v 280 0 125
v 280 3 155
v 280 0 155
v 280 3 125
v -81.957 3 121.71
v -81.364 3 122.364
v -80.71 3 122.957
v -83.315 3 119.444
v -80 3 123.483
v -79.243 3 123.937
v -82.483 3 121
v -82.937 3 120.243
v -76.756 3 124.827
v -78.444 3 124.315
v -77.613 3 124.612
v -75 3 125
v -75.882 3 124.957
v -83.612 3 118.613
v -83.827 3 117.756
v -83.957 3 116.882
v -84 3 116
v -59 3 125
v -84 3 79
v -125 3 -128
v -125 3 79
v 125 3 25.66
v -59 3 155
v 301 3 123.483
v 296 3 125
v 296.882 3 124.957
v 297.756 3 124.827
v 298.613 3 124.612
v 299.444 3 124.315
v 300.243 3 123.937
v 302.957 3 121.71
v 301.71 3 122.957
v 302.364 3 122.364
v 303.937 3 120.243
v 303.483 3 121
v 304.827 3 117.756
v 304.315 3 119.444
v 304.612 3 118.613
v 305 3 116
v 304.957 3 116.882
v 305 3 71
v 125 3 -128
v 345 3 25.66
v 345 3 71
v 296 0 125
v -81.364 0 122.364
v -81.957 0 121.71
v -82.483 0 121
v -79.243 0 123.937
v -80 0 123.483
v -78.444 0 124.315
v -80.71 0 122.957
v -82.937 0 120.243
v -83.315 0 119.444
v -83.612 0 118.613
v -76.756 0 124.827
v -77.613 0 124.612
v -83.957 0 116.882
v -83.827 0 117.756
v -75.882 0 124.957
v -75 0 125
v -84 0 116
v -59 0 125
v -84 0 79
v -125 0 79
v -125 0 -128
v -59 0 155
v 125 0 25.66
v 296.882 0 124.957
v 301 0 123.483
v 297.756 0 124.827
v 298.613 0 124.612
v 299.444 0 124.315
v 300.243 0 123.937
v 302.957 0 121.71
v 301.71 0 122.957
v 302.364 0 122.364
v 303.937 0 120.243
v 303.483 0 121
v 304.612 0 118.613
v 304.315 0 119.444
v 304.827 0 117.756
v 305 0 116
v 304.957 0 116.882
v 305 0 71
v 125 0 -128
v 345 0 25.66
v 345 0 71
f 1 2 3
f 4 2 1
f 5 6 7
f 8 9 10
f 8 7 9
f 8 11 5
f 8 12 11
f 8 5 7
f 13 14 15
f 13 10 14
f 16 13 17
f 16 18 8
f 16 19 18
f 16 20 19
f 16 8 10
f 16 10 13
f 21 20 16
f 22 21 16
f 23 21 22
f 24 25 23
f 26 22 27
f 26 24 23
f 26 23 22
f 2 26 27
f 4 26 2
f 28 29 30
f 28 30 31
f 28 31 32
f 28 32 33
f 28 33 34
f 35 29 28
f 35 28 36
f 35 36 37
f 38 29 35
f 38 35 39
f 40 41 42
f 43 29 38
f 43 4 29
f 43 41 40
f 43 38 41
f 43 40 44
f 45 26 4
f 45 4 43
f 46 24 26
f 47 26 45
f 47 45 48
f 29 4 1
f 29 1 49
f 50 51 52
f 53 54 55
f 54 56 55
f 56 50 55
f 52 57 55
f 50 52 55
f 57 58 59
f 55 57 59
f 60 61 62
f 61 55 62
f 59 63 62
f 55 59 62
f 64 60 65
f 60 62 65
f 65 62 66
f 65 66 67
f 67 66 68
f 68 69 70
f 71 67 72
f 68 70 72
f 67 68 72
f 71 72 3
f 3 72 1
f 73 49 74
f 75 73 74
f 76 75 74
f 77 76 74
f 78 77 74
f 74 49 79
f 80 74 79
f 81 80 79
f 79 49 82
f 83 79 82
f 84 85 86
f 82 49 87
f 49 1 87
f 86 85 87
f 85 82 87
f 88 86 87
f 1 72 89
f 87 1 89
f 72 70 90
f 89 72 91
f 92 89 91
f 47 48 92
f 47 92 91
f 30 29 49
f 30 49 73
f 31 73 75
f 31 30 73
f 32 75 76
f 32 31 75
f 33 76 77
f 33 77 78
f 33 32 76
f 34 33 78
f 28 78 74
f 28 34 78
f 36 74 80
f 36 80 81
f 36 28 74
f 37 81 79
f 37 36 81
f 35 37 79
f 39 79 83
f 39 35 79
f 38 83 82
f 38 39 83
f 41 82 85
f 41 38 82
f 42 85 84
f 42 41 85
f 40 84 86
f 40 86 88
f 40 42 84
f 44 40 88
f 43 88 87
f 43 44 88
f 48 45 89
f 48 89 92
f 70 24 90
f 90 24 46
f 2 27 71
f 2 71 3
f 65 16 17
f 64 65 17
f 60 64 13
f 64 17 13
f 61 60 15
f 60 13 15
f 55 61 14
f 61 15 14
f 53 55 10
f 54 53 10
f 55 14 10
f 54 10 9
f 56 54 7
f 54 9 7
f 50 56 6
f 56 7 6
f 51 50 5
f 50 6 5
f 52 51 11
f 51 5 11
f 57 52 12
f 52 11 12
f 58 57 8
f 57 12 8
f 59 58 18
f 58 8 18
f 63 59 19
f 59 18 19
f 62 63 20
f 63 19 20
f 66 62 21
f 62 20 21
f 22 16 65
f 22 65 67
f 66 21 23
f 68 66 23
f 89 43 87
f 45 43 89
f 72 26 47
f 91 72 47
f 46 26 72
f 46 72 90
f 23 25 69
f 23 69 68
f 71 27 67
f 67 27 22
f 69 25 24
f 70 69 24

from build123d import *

# Parameters (mm, degrees)
CROQUIS1_W              = 250
CROQUIS1_H              = 250
SALIENTE_EXTRUIR1_DEPTH = 3
CROQUIS2_W              = 250
CROQUIS2_H              = 3
SALIENTE_EXTRUIR2_DEPTH = 3
CROQUIS3_W              = 220
CROQUIS3_H              = 99.34
SALIENTE_EXTRUIR4_DEPTH = 3
CROQUIS4_W              = 41
CROQUIS4_H              = 52
CORTAR_EXTRUIR1_DEPTH   = 3
CORTAR_EXTRUIR2_DEPTH   = 3
CROQUIS6_W              = 339
CROQUIS6_H              = 30
SALIENTE_EXTRUIR5_DEPTH = 3
CORTAR_EXTRUIR3_DEPTH   = 3
CROQUIS8_W              = 1
CROQUIS8_H              = 44
SALIENTE_EXTRUIR6_DEPTH = 3
SALIENTE_EXTRUIR7_DEPTH = 3
CROQUIS10_W             = 41
CROQUIS10_H             = 6
SALIENTE_EXTRUIR9_DEPTH = 3
CROQUIS11_W             = 40
CROQUIS11_H             = 1
CORTAR_EXTRUIR4_DEPTH   = 3


with BuildPart() as part:
    # Croquis1 → Saliente-Extruir1 (new body)
    with BuildSketch(Plane(origin=(0, 0, 0), x_dir=(1, 0, 0), z_dir=(0, 1, 0))):
        Rectangle(CROQUIS1_W, CROQUIS1_H)
    extrude(amount=SALIENTE_EXTRUIR1_DEPTH)

    # Croquis2 → Saliente-Extruir2 (add)
    with BuildSketch(Plane(origin=(0, 3, 0), x_dir=(1, 0, 0), z_dir=(0, 1, 0))):
        with Locations((0, 126.5)):
            Rectangle(CROQUIS2_W, CROQUIS2_H)
    extrude(amount=-SALIENTE_EXTRUIR2_DEPTH)

    # Croquis3 → Saliente-Extruir4 (add)
    with BuildSketch(Plane(origin=(0, 3, 0), x_dir=(1, 0, 0), z_dir=(0, 1, 0))):
        with Locations((235, -75.33)):
            Rectangle(CROQUIS3_W, CROQUIS3_H)
    extrude(amount=-SALIENTE_EXTRUIR4_DEPTH)

    # Croquis4 → Cortar-Extruir1 (cut)
    with BuildSketch(Plane(origin=(0, 3, 0), x_dir=(1, 0, 0), z_dir=(0, 1, 0))):
        with Locations((-104.5, -99)):
            Rectangle(CROQUIS4_W, CROQUIS4_H)
    extrude(amount=-CORTAR_EXTRUIR1_DEPTH, mode=Mode.SUBTRACT)

    # Croquis5 → Cortar-Extruir2 (cut)
    with BuildSketch(Plane(origin=(0, 3, 0), x_dir=(1, 0, 0), z_dir=(0, 1, 0))):
        with BuildLine():
            Line((-84, -116), (-84, -125))
            Line((-84, -125), (-75, -125))
            ThreePointArc((-75, -125), (-81.363961031, -122.363961031), (-84, -116))
        make_face()
    extrude(amount=-CORTAR_EXTRUIR2_DEPTH, mode=Mode.SUBTRACT)

    # Croquis6 → Saliente-Extruir5 (add)
    with BuildSketch(Plane(origin=(0, 3, 0), x_dir=(1, 0, 0), z_dir=(0, 1, 0))):
        with Locations((110.5, -140)):
            Rectangle(CROQUIS6_W, CROQUIS6_H)
    extrude(amount=-SALIENTE_EXTRUIR5_DEPTH)

    # Croquis7 → Cortar-Extruir3 (cut)
    with BuildSketch(Plane(origin=(0, 3, 0), x_dir=(1, 0, 0), z_dir=(0, 1, 0))):
        with BuildLine():
            Line((345, -72), (304, -72))
            Line((304, -72), (304, -116))
            ThreePointArc((304, -116), (301.363961031, -122.363961031), (295, -125))
            Line((295, -125), (345, -125))
            Line((345, -125), (345, -72))
        make_face()
    extrude(amount=-CORTAR_EXTRUIR3_DEPTH, mode=Mode.SUBTRACT)

    # Croquis8 → Saliente-Extruir6 (add)
    with BuildSketch(Plane(origin=(0, 3, 0), x_dir=(1, 0, 0), z_dir=(0, 1, 0))):
        with Locations((304.5, -94)):
            Rectangle(CROQUIS8_W, CROQUIS8_H)
    extrude(amount=-SALIENTE_EXTRUIR6_DEPTH)

    # Croquis9 → Saliente-Extruir7 (add)
    with BuildSketch(Plane(origin=(0, 3, 0), x_dir=(1, 0, 0), z_dir=(0, 1, 0))):
        with BuildLine():
            Line((295, -125), (296, -125))
            ThreePointArc((296, -125), (302.363961031, -122.363961031), (305, -116))
            Line((305, -116), (304, -116))
            Line((304, -116), (295, -125))
        make_face()
    extrude(amount=-SALIENTE_EXTRUIR7_DEPTH)

    # Croquis10 → Saliente-Extruir9 (add)
    with BuildSketch(Plane(origin=(0, 3, 0), x_dir=(1, 0, 0), z_dir=(0, 1, 0))):
        with Locations((-104.5, -76)):
            Rectangle(CROQUIS10_W, CROQUIS10_H)
    extrude(amount=-SALIENTE_EXTRUIR9_DEPTH)

    # Croquis11 → Cortar-Extruir4 (cut)
    with BuildSketch(Plane(origin=(0, 3, 0), x_dir=(1, 0, 0), z_dir=(0, 1, 0))):
        with Locations((325, -71.5)):
            Rectangle(CROQUIS11_W, CROQUIS11_H)
    extrude(amount=-CORTAR_EXTRUIR4_DEPTH, mode=Mode.SUBTRACT)


solid = part.part
